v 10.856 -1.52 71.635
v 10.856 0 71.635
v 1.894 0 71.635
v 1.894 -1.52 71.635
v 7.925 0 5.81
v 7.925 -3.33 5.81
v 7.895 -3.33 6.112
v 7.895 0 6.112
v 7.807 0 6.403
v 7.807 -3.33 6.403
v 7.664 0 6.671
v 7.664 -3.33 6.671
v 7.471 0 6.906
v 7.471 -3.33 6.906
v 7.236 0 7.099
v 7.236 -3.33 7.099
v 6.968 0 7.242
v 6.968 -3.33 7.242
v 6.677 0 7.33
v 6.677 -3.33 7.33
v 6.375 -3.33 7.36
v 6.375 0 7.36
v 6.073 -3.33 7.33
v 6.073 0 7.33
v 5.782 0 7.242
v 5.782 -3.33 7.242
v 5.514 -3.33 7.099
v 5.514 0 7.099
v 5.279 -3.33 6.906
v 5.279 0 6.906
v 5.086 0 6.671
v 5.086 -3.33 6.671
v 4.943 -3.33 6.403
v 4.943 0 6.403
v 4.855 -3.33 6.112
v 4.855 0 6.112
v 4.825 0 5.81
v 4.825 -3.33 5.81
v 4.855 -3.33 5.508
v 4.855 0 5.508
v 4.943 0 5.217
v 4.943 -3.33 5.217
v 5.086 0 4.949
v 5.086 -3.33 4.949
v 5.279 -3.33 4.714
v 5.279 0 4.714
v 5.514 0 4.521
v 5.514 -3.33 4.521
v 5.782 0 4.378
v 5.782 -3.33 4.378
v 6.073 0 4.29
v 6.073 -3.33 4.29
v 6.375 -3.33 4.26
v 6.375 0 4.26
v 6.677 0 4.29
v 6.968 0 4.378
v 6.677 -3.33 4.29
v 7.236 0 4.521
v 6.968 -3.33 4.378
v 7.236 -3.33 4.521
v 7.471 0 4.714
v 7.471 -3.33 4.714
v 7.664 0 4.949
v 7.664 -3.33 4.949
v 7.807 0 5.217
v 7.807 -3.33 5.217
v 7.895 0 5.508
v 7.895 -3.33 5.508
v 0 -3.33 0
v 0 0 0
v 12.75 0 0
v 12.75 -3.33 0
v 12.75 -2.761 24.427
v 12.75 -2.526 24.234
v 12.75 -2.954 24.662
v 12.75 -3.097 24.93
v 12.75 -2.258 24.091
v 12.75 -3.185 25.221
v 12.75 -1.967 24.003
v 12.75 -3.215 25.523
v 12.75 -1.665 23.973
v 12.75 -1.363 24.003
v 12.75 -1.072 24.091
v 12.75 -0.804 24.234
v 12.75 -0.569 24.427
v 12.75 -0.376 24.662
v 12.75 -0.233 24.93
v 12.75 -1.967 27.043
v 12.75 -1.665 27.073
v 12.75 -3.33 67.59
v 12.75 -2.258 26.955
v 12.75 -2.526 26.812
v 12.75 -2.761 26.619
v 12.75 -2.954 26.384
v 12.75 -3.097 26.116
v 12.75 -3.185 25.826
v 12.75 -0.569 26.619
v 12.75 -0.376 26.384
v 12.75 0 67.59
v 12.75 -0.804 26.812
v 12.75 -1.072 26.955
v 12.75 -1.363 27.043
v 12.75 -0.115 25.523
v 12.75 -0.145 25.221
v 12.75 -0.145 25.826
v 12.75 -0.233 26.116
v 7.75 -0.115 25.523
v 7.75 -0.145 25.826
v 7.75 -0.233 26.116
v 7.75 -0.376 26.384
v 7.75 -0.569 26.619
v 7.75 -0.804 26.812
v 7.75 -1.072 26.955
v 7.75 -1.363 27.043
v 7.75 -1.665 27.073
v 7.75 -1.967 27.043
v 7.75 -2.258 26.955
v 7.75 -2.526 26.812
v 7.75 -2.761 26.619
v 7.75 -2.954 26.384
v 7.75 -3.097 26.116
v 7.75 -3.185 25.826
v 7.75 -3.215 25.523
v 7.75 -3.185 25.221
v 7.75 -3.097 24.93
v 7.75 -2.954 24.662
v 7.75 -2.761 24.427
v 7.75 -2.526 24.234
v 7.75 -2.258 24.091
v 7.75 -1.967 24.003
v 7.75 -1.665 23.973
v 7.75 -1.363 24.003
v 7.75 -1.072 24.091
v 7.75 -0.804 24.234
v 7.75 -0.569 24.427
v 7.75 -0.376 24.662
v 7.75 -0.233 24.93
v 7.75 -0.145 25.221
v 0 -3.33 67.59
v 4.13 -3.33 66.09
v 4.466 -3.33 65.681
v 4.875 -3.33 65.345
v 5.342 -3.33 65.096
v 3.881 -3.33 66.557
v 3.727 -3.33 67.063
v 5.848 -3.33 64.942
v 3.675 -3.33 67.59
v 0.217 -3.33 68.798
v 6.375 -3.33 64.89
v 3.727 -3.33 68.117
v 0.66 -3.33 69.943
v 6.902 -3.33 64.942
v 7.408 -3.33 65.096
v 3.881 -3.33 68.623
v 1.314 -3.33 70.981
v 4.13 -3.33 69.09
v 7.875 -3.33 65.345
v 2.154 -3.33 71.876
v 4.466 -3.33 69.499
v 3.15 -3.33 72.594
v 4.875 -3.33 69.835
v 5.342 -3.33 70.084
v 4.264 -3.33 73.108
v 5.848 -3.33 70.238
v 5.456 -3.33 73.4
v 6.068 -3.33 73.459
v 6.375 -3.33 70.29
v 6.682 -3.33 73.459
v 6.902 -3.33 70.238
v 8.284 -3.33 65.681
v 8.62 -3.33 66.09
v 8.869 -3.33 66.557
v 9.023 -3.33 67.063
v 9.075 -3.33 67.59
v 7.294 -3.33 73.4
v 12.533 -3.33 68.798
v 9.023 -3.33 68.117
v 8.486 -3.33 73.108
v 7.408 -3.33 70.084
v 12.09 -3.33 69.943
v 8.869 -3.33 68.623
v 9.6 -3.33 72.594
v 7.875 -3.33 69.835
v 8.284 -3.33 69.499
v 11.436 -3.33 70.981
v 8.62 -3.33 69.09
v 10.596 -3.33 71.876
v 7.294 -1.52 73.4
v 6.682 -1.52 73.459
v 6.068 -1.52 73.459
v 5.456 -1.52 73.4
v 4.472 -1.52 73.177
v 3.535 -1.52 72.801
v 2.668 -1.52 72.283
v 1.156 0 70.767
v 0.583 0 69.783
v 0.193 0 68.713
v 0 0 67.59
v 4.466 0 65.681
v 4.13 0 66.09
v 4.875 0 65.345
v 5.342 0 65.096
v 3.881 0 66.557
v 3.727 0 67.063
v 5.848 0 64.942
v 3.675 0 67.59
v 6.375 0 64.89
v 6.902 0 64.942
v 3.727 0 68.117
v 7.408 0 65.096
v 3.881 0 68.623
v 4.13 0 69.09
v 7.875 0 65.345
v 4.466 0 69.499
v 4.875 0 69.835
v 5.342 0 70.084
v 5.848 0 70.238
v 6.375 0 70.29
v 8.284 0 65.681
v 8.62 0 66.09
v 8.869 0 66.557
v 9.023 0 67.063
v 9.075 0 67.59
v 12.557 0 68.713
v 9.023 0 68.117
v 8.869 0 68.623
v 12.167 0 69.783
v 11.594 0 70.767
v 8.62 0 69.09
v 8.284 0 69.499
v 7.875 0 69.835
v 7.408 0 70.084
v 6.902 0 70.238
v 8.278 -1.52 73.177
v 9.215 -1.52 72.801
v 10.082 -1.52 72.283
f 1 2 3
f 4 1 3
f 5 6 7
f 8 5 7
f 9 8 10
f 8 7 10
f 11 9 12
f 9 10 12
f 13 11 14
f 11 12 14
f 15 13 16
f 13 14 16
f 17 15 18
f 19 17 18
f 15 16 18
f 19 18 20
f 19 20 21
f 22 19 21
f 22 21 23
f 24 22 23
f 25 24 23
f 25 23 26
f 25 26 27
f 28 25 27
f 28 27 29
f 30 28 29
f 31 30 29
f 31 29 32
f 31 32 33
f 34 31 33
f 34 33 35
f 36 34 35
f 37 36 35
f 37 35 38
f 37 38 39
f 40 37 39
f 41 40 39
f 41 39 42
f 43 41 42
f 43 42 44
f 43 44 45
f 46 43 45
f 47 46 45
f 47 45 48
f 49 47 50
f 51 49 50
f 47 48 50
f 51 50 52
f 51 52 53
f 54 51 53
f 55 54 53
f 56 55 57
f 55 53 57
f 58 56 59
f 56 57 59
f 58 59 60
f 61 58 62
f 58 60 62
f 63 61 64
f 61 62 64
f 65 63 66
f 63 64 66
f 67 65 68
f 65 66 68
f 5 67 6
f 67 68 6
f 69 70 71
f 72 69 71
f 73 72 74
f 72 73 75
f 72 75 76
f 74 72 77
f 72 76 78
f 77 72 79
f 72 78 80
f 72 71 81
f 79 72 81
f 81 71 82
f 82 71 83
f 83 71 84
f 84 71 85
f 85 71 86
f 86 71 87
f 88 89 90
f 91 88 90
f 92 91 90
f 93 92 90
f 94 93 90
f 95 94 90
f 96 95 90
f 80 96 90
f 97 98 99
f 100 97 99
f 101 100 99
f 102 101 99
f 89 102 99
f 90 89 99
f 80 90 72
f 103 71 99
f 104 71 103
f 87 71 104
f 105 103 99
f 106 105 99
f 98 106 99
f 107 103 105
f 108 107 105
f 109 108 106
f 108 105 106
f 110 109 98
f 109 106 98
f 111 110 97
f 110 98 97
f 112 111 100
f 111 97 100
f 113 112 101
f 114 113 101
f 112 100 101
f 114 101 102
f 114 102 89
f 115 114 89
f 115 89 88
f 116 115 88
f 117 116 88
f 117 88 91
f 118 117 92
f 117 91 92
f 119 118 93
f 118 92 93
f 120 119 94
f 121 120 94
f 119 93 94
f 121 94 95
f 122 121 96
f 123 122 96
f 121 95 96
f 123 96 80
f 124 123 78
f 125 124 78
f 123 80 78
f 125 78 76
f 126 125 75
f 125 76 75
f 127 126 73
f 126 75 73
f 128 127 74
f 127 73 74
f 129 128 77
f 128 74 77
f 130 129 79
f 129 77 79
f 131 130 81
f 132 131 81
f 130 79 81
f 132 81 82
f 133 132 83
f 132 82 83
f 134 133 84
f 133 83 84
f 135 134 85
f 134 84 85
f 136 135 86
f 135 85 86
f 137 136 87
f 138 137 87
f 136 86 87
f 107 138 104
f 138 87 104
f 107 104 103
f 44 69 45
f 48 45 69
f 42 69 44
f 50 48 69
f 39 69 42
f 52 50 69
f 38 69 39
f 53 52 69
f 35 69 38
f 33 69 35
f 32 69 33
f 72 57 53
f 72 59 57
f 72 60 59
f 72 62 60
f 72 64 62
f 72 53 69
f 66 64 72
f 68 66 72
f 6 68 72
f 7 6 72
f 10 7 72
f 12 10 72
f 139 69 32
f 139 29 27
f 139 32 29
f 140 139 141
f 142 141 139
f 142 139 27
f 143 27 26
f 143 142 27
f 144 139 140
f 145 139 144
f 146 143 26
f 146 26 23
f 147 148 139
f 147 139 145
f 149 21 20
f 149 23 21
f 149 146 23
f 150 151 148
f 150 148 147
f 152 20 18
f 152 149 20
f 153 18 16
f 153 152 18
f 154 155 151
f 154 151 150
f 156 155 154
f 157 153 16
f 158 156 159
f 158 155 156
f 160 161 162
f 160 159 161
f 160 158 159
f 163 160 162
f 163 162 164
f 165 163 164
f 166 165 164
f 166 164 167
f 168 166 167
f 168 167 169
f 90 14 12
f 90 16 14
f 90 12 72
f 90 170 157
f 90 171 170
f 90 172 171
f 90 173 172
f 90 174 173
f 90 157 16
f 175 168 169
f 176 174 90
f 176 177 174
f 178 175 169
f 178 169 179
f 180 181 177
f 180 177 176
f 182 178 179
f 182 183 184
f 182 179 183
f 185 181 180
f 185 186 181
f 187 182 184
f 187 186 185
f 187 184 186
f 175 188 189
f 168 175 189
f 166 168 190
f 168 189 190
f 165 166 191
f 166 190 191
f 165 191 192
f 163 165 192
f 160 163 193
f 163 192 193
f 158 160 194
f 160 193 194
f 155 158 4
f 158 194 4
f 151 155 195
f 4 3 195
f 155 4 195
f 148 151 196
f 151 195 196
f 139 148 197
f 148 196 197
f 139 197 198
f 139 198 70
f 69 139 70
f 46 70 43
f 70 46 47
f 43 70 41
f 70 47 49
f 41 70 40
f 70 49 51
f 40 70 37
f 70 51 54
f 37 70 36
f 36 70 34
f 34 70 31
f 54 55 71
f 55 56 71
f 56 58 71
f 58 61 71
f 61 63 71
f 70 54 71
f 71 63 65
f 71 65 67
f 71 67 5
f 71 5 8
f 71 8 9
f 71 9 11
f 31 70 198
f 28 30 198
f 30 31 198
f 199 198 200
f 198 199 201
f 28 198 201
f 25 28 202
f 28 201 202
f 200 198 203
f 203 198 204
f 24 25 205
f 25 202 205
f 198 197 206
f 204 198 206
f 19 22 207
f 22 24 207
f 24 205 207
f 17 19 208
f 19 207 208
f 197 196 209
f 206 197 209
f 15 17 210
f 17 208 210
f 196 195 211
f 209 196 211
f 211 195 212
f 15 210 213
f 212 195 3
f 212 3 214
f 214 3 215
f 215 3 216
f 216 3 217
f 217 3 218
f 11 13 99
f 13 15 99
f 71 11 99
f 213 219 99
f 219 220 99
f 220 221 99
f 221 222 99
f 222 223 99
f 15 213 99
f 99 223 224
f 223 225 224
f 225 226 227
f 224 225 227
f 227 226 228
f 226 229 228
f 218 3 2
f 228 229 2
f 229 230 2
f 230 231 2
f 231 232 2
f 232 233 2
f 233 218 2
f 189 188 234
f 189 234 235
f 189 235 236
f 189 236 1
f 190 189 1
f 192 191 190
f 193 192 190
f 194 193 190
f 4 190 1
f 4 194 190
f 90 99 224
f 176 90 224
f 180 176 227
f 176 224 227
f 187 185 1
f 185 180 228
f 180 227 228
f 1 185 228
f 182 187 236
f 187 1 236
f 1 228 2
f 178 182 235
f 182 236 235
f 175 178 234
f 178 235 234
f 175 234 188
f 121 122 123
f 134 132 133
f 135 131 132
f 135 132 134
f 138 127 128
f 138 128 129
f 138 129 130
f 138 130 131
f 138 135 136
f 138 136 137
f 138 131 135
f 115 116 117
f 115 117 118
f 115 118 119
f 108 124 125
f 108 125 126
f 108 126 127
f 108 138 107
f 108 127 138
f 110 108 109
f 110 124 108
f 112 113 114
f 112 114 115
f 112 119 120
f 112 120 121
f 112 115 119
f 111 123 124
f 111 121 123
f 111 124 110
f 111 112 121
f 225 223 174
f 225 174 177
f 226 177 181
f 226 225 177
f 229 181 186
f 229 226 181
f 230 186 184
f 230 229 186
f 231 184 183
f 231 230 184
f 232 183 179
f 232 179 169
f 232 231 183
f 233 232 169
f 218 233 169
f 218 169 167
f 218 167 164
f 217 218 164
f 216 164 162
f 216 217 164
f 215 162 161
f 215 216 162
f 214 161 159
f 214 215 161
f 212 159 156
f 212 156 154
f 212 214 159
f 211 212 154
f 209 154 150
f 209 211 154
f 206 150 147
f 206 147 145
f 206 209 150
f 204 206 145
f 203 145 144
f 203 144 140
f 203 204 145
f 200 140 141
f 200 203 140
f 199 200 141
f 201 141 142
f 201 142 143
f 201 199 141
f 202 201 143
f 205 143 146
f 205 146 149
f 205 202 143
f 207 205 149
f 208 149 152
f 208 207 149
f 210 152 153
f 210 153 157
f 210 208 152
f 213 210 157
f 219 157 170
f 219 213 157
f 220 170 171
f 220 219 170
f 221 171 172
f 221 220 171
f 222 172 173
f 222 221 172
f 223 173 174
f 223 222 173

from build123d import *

# Parameters (mm, degrees)
F0_R     = 2.7
F1_DEPTH = 3.33
F3_W     = 16.370755
F3_H     = 3.245242
F4_DEPTH = 1.52
F5_R     = 1.55
F6_DEPTH = 3.331
F7_R     = 1.55
F8_DEPTH = 5


with BuildPart() as f1:
    # F0 (on Front) → F1 (new body)
    with BuildSketch(Plane.XZ):
        with BuildLine():
            Line((0, 67.59), (0, 0))
            Line((0, 0), (12.75, 0))
            Line((12.75, 0), (12.75, 67.59))
            ThreePointArc((12.75, 67.59), (11.037405, 71.448822), (7.293558, 73.4))
            Line((7.293558, 73.4), (5.456442, 73.4))
            ThreePointArc((5.456442, 73.4), (1.712595, 71.448822), (0, 67.59))
        make_face()
        with Locations((6.375, 67.59)):
            Circle(F0_R, mode=Mode.SUBTRACT)
        with BuildLine():
            ThreePointArc((7.293558, 73.4), (6.375, 73.466301), (5.456442, 73.4))
            Line((5.456442, 73.4), (7.293558, 73.4))
        make_face()
    extrude(amount=F1_DEPTH)

    # F3 (on face) → F4 (cut)
    with BuildSketch(Plane(origin=(0, 0, 0), x_dir=(-1, 0, 0), z_dir=(0, 1, 0))):
        with Locations((-6.359821, 73.257189)):
            Rectangle(F3_W, F3_H)
    extrude(amount=-F4_DEPTH, mode=Mode.SUBTRACT)

    # F5 (on face) → F6 (cut, through all)
    with BuildSketch(Plane.XZ.offset(3.33)):
        with Locations((6.375, 5.81)):
            Circle(F5_R)
    extrude(amount=-F6_DEPTH, mode=Mode.SUBTRACT)

    # F7 (on face) → F8 (cut)
    with BuildSketch(Plane.YZ.offset(12.75)):
        with Locations((-1.665, 25.523206)):
            Circle(F7_R)
    extrude(amount=-F8_DEPTH, mode=Mode.SUBTRACT)


solid = f1.part
